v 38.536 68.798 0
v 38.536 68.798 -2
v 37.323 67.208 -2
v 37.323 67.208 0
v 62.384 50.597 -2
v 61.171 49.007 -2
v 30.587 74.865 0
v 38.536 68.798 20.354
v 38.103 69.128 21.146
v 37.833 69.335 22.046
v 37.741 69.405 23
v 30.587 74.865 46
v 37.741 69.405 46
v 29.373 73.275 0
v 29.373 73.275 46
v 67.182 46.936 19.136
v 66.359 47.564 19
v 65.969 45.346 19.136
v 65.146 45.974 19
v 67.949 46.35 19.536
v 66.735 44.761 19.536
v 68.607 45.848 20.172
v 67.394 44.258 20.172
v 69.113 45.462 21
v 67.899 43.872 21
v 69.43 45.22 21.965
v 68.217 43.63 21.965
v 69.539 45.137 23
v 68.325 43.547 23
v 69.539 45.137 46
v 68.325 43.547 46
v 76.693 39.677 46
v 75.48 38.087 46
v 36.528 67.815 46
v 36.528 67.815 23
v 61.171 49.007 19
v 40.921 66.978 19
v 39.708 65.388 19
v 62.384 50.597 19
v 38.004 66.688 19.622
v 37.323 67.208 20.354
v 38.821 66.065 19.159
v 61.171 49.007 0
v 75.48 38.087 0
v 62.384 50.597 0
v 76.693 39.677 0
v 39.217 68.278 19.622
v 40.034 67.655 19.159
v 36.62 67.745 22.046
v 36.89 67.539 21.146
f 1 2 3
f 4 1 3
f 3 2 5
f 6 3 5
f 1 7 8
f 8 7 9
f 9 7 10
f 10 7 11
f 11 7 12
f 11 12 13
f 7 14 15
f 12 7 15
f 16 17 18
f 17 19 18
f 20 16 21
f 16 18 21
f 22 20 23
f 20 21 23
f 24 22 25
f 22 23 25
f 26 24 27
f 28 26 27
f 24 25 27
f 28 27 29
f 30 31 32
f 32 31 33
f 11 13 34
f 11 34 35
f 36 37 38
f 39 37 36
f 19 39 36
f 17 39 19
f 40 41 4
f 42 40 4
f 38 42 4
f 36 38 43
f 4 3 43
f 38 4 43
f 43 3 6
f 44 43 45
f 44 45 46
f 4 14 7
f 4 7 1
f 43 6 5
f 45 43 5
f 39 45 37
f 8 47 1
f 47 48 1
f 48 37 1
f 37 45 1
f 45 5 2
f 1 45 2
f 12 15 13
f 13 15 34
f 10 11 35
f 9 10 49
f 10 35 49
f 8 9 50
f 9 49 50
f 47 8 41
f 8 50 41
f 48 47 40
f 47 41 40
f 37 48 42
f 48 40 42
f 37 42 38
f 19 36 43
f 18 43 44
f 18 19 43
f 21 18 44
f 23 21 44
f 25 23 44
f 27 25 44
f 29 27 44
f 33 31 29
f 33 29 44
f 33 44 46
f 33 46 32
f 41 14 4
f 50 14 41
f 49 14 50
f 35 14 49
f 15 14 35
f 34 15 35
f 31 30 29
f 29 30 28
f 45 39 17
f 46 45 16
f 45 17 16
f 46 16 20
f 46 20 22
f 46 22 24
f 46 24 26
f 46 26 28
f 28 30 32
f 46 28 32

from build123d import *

# Parameters (mm, degrees)
ESTRUSIONE_ESTRUSIONE1_DEPTH      = 46
ESTRUSIONE_ESTRUSIONE1_DEPTH_BACK = 2
SCHIZZO2_W                        = 10
SCHIZZO2_H                        = 46
SCHIZZO2_W_2                      = 18
ESTRUSIONE_ESTRUSIONE2_DEPTH      = 2
SCHIZZO3_W                        = 40
SCHIZZO3_H                        = 27
TAGLIO_ESTRUSIONE1_DEPTH          = 10
RACCORDO1_R                       = 4


with BuildPart() as part:
    # Schizzo1 → Estrusione-Estrusione1 (new, two sides: drawn at the far end of the back side and taken through both)
    with BuildSketch(Plane.XY.offset(-ESTRUSIONE_ESTRUSIONE1_DEPTH_BACK)):
        Polygon((62.384284835, 50.597287007), (38.536156503, 68.79802257), (37.322774132, 67.208147347), (61.170902464, 49.007411784), align=None)
    extrude(amount=ESTRUSIONE_ESTRUSIONE1_DEPTH + ESTRUSIONE_ESTRUSIONE1_DEPTH_BACK)

    # Schizzo2 → Estrusione-Estrusione2 (add)
    with BuildSketch(Plane(origin=(46.150805657, 60.470651428, 0), x_dir=(0.7949376110826004, -0.606691185436453, 0), z_dir=(-0.606691185436453, -0.7949376110826004, 0))):
        with Locations((-16.105313678, 23)):
            Rectangle(SCHIZZO2_W, SCHIZZO2_H)
        with Locations((27.894686322, 23)):
            Rectangle(SCHIZZO2_W_2, SCHIZZO2_H)
    extrude(amount=-ESTRUSIONE_ESTRUSIONE2_DEPTH)

    # Schizzo3 → Taglio-Estrusione1 (cut)
    with BuildSketch(Plane(origin=(47.364188028, 62.06052665, 0), x_dir=(0.7949376110826014, -0.6066911854364516, 0), z_dir=(0.6066911854364516, 0.7949376110826014, 0))):
        with Locations((7.894686322, -32.5)):
            Rectangle(SCHIZZO3_W, SCHIZZO3_H)
    extrude(amount=-TAGLIO_ESTRUSIONE1_DEPTH, mode=Mode.SUBTRACT)

    # Raccordo1
    raccordo1_edges = [part.edges().sort_by_distance(p)[0] for p in [
        (37.134527706, 68.609776144, 19),
        (68.932032149, 44.342128727, 19),
    ]]
    fillet(raccordo1_edges, radius=RACCORDO1_R)


solid = part.part
